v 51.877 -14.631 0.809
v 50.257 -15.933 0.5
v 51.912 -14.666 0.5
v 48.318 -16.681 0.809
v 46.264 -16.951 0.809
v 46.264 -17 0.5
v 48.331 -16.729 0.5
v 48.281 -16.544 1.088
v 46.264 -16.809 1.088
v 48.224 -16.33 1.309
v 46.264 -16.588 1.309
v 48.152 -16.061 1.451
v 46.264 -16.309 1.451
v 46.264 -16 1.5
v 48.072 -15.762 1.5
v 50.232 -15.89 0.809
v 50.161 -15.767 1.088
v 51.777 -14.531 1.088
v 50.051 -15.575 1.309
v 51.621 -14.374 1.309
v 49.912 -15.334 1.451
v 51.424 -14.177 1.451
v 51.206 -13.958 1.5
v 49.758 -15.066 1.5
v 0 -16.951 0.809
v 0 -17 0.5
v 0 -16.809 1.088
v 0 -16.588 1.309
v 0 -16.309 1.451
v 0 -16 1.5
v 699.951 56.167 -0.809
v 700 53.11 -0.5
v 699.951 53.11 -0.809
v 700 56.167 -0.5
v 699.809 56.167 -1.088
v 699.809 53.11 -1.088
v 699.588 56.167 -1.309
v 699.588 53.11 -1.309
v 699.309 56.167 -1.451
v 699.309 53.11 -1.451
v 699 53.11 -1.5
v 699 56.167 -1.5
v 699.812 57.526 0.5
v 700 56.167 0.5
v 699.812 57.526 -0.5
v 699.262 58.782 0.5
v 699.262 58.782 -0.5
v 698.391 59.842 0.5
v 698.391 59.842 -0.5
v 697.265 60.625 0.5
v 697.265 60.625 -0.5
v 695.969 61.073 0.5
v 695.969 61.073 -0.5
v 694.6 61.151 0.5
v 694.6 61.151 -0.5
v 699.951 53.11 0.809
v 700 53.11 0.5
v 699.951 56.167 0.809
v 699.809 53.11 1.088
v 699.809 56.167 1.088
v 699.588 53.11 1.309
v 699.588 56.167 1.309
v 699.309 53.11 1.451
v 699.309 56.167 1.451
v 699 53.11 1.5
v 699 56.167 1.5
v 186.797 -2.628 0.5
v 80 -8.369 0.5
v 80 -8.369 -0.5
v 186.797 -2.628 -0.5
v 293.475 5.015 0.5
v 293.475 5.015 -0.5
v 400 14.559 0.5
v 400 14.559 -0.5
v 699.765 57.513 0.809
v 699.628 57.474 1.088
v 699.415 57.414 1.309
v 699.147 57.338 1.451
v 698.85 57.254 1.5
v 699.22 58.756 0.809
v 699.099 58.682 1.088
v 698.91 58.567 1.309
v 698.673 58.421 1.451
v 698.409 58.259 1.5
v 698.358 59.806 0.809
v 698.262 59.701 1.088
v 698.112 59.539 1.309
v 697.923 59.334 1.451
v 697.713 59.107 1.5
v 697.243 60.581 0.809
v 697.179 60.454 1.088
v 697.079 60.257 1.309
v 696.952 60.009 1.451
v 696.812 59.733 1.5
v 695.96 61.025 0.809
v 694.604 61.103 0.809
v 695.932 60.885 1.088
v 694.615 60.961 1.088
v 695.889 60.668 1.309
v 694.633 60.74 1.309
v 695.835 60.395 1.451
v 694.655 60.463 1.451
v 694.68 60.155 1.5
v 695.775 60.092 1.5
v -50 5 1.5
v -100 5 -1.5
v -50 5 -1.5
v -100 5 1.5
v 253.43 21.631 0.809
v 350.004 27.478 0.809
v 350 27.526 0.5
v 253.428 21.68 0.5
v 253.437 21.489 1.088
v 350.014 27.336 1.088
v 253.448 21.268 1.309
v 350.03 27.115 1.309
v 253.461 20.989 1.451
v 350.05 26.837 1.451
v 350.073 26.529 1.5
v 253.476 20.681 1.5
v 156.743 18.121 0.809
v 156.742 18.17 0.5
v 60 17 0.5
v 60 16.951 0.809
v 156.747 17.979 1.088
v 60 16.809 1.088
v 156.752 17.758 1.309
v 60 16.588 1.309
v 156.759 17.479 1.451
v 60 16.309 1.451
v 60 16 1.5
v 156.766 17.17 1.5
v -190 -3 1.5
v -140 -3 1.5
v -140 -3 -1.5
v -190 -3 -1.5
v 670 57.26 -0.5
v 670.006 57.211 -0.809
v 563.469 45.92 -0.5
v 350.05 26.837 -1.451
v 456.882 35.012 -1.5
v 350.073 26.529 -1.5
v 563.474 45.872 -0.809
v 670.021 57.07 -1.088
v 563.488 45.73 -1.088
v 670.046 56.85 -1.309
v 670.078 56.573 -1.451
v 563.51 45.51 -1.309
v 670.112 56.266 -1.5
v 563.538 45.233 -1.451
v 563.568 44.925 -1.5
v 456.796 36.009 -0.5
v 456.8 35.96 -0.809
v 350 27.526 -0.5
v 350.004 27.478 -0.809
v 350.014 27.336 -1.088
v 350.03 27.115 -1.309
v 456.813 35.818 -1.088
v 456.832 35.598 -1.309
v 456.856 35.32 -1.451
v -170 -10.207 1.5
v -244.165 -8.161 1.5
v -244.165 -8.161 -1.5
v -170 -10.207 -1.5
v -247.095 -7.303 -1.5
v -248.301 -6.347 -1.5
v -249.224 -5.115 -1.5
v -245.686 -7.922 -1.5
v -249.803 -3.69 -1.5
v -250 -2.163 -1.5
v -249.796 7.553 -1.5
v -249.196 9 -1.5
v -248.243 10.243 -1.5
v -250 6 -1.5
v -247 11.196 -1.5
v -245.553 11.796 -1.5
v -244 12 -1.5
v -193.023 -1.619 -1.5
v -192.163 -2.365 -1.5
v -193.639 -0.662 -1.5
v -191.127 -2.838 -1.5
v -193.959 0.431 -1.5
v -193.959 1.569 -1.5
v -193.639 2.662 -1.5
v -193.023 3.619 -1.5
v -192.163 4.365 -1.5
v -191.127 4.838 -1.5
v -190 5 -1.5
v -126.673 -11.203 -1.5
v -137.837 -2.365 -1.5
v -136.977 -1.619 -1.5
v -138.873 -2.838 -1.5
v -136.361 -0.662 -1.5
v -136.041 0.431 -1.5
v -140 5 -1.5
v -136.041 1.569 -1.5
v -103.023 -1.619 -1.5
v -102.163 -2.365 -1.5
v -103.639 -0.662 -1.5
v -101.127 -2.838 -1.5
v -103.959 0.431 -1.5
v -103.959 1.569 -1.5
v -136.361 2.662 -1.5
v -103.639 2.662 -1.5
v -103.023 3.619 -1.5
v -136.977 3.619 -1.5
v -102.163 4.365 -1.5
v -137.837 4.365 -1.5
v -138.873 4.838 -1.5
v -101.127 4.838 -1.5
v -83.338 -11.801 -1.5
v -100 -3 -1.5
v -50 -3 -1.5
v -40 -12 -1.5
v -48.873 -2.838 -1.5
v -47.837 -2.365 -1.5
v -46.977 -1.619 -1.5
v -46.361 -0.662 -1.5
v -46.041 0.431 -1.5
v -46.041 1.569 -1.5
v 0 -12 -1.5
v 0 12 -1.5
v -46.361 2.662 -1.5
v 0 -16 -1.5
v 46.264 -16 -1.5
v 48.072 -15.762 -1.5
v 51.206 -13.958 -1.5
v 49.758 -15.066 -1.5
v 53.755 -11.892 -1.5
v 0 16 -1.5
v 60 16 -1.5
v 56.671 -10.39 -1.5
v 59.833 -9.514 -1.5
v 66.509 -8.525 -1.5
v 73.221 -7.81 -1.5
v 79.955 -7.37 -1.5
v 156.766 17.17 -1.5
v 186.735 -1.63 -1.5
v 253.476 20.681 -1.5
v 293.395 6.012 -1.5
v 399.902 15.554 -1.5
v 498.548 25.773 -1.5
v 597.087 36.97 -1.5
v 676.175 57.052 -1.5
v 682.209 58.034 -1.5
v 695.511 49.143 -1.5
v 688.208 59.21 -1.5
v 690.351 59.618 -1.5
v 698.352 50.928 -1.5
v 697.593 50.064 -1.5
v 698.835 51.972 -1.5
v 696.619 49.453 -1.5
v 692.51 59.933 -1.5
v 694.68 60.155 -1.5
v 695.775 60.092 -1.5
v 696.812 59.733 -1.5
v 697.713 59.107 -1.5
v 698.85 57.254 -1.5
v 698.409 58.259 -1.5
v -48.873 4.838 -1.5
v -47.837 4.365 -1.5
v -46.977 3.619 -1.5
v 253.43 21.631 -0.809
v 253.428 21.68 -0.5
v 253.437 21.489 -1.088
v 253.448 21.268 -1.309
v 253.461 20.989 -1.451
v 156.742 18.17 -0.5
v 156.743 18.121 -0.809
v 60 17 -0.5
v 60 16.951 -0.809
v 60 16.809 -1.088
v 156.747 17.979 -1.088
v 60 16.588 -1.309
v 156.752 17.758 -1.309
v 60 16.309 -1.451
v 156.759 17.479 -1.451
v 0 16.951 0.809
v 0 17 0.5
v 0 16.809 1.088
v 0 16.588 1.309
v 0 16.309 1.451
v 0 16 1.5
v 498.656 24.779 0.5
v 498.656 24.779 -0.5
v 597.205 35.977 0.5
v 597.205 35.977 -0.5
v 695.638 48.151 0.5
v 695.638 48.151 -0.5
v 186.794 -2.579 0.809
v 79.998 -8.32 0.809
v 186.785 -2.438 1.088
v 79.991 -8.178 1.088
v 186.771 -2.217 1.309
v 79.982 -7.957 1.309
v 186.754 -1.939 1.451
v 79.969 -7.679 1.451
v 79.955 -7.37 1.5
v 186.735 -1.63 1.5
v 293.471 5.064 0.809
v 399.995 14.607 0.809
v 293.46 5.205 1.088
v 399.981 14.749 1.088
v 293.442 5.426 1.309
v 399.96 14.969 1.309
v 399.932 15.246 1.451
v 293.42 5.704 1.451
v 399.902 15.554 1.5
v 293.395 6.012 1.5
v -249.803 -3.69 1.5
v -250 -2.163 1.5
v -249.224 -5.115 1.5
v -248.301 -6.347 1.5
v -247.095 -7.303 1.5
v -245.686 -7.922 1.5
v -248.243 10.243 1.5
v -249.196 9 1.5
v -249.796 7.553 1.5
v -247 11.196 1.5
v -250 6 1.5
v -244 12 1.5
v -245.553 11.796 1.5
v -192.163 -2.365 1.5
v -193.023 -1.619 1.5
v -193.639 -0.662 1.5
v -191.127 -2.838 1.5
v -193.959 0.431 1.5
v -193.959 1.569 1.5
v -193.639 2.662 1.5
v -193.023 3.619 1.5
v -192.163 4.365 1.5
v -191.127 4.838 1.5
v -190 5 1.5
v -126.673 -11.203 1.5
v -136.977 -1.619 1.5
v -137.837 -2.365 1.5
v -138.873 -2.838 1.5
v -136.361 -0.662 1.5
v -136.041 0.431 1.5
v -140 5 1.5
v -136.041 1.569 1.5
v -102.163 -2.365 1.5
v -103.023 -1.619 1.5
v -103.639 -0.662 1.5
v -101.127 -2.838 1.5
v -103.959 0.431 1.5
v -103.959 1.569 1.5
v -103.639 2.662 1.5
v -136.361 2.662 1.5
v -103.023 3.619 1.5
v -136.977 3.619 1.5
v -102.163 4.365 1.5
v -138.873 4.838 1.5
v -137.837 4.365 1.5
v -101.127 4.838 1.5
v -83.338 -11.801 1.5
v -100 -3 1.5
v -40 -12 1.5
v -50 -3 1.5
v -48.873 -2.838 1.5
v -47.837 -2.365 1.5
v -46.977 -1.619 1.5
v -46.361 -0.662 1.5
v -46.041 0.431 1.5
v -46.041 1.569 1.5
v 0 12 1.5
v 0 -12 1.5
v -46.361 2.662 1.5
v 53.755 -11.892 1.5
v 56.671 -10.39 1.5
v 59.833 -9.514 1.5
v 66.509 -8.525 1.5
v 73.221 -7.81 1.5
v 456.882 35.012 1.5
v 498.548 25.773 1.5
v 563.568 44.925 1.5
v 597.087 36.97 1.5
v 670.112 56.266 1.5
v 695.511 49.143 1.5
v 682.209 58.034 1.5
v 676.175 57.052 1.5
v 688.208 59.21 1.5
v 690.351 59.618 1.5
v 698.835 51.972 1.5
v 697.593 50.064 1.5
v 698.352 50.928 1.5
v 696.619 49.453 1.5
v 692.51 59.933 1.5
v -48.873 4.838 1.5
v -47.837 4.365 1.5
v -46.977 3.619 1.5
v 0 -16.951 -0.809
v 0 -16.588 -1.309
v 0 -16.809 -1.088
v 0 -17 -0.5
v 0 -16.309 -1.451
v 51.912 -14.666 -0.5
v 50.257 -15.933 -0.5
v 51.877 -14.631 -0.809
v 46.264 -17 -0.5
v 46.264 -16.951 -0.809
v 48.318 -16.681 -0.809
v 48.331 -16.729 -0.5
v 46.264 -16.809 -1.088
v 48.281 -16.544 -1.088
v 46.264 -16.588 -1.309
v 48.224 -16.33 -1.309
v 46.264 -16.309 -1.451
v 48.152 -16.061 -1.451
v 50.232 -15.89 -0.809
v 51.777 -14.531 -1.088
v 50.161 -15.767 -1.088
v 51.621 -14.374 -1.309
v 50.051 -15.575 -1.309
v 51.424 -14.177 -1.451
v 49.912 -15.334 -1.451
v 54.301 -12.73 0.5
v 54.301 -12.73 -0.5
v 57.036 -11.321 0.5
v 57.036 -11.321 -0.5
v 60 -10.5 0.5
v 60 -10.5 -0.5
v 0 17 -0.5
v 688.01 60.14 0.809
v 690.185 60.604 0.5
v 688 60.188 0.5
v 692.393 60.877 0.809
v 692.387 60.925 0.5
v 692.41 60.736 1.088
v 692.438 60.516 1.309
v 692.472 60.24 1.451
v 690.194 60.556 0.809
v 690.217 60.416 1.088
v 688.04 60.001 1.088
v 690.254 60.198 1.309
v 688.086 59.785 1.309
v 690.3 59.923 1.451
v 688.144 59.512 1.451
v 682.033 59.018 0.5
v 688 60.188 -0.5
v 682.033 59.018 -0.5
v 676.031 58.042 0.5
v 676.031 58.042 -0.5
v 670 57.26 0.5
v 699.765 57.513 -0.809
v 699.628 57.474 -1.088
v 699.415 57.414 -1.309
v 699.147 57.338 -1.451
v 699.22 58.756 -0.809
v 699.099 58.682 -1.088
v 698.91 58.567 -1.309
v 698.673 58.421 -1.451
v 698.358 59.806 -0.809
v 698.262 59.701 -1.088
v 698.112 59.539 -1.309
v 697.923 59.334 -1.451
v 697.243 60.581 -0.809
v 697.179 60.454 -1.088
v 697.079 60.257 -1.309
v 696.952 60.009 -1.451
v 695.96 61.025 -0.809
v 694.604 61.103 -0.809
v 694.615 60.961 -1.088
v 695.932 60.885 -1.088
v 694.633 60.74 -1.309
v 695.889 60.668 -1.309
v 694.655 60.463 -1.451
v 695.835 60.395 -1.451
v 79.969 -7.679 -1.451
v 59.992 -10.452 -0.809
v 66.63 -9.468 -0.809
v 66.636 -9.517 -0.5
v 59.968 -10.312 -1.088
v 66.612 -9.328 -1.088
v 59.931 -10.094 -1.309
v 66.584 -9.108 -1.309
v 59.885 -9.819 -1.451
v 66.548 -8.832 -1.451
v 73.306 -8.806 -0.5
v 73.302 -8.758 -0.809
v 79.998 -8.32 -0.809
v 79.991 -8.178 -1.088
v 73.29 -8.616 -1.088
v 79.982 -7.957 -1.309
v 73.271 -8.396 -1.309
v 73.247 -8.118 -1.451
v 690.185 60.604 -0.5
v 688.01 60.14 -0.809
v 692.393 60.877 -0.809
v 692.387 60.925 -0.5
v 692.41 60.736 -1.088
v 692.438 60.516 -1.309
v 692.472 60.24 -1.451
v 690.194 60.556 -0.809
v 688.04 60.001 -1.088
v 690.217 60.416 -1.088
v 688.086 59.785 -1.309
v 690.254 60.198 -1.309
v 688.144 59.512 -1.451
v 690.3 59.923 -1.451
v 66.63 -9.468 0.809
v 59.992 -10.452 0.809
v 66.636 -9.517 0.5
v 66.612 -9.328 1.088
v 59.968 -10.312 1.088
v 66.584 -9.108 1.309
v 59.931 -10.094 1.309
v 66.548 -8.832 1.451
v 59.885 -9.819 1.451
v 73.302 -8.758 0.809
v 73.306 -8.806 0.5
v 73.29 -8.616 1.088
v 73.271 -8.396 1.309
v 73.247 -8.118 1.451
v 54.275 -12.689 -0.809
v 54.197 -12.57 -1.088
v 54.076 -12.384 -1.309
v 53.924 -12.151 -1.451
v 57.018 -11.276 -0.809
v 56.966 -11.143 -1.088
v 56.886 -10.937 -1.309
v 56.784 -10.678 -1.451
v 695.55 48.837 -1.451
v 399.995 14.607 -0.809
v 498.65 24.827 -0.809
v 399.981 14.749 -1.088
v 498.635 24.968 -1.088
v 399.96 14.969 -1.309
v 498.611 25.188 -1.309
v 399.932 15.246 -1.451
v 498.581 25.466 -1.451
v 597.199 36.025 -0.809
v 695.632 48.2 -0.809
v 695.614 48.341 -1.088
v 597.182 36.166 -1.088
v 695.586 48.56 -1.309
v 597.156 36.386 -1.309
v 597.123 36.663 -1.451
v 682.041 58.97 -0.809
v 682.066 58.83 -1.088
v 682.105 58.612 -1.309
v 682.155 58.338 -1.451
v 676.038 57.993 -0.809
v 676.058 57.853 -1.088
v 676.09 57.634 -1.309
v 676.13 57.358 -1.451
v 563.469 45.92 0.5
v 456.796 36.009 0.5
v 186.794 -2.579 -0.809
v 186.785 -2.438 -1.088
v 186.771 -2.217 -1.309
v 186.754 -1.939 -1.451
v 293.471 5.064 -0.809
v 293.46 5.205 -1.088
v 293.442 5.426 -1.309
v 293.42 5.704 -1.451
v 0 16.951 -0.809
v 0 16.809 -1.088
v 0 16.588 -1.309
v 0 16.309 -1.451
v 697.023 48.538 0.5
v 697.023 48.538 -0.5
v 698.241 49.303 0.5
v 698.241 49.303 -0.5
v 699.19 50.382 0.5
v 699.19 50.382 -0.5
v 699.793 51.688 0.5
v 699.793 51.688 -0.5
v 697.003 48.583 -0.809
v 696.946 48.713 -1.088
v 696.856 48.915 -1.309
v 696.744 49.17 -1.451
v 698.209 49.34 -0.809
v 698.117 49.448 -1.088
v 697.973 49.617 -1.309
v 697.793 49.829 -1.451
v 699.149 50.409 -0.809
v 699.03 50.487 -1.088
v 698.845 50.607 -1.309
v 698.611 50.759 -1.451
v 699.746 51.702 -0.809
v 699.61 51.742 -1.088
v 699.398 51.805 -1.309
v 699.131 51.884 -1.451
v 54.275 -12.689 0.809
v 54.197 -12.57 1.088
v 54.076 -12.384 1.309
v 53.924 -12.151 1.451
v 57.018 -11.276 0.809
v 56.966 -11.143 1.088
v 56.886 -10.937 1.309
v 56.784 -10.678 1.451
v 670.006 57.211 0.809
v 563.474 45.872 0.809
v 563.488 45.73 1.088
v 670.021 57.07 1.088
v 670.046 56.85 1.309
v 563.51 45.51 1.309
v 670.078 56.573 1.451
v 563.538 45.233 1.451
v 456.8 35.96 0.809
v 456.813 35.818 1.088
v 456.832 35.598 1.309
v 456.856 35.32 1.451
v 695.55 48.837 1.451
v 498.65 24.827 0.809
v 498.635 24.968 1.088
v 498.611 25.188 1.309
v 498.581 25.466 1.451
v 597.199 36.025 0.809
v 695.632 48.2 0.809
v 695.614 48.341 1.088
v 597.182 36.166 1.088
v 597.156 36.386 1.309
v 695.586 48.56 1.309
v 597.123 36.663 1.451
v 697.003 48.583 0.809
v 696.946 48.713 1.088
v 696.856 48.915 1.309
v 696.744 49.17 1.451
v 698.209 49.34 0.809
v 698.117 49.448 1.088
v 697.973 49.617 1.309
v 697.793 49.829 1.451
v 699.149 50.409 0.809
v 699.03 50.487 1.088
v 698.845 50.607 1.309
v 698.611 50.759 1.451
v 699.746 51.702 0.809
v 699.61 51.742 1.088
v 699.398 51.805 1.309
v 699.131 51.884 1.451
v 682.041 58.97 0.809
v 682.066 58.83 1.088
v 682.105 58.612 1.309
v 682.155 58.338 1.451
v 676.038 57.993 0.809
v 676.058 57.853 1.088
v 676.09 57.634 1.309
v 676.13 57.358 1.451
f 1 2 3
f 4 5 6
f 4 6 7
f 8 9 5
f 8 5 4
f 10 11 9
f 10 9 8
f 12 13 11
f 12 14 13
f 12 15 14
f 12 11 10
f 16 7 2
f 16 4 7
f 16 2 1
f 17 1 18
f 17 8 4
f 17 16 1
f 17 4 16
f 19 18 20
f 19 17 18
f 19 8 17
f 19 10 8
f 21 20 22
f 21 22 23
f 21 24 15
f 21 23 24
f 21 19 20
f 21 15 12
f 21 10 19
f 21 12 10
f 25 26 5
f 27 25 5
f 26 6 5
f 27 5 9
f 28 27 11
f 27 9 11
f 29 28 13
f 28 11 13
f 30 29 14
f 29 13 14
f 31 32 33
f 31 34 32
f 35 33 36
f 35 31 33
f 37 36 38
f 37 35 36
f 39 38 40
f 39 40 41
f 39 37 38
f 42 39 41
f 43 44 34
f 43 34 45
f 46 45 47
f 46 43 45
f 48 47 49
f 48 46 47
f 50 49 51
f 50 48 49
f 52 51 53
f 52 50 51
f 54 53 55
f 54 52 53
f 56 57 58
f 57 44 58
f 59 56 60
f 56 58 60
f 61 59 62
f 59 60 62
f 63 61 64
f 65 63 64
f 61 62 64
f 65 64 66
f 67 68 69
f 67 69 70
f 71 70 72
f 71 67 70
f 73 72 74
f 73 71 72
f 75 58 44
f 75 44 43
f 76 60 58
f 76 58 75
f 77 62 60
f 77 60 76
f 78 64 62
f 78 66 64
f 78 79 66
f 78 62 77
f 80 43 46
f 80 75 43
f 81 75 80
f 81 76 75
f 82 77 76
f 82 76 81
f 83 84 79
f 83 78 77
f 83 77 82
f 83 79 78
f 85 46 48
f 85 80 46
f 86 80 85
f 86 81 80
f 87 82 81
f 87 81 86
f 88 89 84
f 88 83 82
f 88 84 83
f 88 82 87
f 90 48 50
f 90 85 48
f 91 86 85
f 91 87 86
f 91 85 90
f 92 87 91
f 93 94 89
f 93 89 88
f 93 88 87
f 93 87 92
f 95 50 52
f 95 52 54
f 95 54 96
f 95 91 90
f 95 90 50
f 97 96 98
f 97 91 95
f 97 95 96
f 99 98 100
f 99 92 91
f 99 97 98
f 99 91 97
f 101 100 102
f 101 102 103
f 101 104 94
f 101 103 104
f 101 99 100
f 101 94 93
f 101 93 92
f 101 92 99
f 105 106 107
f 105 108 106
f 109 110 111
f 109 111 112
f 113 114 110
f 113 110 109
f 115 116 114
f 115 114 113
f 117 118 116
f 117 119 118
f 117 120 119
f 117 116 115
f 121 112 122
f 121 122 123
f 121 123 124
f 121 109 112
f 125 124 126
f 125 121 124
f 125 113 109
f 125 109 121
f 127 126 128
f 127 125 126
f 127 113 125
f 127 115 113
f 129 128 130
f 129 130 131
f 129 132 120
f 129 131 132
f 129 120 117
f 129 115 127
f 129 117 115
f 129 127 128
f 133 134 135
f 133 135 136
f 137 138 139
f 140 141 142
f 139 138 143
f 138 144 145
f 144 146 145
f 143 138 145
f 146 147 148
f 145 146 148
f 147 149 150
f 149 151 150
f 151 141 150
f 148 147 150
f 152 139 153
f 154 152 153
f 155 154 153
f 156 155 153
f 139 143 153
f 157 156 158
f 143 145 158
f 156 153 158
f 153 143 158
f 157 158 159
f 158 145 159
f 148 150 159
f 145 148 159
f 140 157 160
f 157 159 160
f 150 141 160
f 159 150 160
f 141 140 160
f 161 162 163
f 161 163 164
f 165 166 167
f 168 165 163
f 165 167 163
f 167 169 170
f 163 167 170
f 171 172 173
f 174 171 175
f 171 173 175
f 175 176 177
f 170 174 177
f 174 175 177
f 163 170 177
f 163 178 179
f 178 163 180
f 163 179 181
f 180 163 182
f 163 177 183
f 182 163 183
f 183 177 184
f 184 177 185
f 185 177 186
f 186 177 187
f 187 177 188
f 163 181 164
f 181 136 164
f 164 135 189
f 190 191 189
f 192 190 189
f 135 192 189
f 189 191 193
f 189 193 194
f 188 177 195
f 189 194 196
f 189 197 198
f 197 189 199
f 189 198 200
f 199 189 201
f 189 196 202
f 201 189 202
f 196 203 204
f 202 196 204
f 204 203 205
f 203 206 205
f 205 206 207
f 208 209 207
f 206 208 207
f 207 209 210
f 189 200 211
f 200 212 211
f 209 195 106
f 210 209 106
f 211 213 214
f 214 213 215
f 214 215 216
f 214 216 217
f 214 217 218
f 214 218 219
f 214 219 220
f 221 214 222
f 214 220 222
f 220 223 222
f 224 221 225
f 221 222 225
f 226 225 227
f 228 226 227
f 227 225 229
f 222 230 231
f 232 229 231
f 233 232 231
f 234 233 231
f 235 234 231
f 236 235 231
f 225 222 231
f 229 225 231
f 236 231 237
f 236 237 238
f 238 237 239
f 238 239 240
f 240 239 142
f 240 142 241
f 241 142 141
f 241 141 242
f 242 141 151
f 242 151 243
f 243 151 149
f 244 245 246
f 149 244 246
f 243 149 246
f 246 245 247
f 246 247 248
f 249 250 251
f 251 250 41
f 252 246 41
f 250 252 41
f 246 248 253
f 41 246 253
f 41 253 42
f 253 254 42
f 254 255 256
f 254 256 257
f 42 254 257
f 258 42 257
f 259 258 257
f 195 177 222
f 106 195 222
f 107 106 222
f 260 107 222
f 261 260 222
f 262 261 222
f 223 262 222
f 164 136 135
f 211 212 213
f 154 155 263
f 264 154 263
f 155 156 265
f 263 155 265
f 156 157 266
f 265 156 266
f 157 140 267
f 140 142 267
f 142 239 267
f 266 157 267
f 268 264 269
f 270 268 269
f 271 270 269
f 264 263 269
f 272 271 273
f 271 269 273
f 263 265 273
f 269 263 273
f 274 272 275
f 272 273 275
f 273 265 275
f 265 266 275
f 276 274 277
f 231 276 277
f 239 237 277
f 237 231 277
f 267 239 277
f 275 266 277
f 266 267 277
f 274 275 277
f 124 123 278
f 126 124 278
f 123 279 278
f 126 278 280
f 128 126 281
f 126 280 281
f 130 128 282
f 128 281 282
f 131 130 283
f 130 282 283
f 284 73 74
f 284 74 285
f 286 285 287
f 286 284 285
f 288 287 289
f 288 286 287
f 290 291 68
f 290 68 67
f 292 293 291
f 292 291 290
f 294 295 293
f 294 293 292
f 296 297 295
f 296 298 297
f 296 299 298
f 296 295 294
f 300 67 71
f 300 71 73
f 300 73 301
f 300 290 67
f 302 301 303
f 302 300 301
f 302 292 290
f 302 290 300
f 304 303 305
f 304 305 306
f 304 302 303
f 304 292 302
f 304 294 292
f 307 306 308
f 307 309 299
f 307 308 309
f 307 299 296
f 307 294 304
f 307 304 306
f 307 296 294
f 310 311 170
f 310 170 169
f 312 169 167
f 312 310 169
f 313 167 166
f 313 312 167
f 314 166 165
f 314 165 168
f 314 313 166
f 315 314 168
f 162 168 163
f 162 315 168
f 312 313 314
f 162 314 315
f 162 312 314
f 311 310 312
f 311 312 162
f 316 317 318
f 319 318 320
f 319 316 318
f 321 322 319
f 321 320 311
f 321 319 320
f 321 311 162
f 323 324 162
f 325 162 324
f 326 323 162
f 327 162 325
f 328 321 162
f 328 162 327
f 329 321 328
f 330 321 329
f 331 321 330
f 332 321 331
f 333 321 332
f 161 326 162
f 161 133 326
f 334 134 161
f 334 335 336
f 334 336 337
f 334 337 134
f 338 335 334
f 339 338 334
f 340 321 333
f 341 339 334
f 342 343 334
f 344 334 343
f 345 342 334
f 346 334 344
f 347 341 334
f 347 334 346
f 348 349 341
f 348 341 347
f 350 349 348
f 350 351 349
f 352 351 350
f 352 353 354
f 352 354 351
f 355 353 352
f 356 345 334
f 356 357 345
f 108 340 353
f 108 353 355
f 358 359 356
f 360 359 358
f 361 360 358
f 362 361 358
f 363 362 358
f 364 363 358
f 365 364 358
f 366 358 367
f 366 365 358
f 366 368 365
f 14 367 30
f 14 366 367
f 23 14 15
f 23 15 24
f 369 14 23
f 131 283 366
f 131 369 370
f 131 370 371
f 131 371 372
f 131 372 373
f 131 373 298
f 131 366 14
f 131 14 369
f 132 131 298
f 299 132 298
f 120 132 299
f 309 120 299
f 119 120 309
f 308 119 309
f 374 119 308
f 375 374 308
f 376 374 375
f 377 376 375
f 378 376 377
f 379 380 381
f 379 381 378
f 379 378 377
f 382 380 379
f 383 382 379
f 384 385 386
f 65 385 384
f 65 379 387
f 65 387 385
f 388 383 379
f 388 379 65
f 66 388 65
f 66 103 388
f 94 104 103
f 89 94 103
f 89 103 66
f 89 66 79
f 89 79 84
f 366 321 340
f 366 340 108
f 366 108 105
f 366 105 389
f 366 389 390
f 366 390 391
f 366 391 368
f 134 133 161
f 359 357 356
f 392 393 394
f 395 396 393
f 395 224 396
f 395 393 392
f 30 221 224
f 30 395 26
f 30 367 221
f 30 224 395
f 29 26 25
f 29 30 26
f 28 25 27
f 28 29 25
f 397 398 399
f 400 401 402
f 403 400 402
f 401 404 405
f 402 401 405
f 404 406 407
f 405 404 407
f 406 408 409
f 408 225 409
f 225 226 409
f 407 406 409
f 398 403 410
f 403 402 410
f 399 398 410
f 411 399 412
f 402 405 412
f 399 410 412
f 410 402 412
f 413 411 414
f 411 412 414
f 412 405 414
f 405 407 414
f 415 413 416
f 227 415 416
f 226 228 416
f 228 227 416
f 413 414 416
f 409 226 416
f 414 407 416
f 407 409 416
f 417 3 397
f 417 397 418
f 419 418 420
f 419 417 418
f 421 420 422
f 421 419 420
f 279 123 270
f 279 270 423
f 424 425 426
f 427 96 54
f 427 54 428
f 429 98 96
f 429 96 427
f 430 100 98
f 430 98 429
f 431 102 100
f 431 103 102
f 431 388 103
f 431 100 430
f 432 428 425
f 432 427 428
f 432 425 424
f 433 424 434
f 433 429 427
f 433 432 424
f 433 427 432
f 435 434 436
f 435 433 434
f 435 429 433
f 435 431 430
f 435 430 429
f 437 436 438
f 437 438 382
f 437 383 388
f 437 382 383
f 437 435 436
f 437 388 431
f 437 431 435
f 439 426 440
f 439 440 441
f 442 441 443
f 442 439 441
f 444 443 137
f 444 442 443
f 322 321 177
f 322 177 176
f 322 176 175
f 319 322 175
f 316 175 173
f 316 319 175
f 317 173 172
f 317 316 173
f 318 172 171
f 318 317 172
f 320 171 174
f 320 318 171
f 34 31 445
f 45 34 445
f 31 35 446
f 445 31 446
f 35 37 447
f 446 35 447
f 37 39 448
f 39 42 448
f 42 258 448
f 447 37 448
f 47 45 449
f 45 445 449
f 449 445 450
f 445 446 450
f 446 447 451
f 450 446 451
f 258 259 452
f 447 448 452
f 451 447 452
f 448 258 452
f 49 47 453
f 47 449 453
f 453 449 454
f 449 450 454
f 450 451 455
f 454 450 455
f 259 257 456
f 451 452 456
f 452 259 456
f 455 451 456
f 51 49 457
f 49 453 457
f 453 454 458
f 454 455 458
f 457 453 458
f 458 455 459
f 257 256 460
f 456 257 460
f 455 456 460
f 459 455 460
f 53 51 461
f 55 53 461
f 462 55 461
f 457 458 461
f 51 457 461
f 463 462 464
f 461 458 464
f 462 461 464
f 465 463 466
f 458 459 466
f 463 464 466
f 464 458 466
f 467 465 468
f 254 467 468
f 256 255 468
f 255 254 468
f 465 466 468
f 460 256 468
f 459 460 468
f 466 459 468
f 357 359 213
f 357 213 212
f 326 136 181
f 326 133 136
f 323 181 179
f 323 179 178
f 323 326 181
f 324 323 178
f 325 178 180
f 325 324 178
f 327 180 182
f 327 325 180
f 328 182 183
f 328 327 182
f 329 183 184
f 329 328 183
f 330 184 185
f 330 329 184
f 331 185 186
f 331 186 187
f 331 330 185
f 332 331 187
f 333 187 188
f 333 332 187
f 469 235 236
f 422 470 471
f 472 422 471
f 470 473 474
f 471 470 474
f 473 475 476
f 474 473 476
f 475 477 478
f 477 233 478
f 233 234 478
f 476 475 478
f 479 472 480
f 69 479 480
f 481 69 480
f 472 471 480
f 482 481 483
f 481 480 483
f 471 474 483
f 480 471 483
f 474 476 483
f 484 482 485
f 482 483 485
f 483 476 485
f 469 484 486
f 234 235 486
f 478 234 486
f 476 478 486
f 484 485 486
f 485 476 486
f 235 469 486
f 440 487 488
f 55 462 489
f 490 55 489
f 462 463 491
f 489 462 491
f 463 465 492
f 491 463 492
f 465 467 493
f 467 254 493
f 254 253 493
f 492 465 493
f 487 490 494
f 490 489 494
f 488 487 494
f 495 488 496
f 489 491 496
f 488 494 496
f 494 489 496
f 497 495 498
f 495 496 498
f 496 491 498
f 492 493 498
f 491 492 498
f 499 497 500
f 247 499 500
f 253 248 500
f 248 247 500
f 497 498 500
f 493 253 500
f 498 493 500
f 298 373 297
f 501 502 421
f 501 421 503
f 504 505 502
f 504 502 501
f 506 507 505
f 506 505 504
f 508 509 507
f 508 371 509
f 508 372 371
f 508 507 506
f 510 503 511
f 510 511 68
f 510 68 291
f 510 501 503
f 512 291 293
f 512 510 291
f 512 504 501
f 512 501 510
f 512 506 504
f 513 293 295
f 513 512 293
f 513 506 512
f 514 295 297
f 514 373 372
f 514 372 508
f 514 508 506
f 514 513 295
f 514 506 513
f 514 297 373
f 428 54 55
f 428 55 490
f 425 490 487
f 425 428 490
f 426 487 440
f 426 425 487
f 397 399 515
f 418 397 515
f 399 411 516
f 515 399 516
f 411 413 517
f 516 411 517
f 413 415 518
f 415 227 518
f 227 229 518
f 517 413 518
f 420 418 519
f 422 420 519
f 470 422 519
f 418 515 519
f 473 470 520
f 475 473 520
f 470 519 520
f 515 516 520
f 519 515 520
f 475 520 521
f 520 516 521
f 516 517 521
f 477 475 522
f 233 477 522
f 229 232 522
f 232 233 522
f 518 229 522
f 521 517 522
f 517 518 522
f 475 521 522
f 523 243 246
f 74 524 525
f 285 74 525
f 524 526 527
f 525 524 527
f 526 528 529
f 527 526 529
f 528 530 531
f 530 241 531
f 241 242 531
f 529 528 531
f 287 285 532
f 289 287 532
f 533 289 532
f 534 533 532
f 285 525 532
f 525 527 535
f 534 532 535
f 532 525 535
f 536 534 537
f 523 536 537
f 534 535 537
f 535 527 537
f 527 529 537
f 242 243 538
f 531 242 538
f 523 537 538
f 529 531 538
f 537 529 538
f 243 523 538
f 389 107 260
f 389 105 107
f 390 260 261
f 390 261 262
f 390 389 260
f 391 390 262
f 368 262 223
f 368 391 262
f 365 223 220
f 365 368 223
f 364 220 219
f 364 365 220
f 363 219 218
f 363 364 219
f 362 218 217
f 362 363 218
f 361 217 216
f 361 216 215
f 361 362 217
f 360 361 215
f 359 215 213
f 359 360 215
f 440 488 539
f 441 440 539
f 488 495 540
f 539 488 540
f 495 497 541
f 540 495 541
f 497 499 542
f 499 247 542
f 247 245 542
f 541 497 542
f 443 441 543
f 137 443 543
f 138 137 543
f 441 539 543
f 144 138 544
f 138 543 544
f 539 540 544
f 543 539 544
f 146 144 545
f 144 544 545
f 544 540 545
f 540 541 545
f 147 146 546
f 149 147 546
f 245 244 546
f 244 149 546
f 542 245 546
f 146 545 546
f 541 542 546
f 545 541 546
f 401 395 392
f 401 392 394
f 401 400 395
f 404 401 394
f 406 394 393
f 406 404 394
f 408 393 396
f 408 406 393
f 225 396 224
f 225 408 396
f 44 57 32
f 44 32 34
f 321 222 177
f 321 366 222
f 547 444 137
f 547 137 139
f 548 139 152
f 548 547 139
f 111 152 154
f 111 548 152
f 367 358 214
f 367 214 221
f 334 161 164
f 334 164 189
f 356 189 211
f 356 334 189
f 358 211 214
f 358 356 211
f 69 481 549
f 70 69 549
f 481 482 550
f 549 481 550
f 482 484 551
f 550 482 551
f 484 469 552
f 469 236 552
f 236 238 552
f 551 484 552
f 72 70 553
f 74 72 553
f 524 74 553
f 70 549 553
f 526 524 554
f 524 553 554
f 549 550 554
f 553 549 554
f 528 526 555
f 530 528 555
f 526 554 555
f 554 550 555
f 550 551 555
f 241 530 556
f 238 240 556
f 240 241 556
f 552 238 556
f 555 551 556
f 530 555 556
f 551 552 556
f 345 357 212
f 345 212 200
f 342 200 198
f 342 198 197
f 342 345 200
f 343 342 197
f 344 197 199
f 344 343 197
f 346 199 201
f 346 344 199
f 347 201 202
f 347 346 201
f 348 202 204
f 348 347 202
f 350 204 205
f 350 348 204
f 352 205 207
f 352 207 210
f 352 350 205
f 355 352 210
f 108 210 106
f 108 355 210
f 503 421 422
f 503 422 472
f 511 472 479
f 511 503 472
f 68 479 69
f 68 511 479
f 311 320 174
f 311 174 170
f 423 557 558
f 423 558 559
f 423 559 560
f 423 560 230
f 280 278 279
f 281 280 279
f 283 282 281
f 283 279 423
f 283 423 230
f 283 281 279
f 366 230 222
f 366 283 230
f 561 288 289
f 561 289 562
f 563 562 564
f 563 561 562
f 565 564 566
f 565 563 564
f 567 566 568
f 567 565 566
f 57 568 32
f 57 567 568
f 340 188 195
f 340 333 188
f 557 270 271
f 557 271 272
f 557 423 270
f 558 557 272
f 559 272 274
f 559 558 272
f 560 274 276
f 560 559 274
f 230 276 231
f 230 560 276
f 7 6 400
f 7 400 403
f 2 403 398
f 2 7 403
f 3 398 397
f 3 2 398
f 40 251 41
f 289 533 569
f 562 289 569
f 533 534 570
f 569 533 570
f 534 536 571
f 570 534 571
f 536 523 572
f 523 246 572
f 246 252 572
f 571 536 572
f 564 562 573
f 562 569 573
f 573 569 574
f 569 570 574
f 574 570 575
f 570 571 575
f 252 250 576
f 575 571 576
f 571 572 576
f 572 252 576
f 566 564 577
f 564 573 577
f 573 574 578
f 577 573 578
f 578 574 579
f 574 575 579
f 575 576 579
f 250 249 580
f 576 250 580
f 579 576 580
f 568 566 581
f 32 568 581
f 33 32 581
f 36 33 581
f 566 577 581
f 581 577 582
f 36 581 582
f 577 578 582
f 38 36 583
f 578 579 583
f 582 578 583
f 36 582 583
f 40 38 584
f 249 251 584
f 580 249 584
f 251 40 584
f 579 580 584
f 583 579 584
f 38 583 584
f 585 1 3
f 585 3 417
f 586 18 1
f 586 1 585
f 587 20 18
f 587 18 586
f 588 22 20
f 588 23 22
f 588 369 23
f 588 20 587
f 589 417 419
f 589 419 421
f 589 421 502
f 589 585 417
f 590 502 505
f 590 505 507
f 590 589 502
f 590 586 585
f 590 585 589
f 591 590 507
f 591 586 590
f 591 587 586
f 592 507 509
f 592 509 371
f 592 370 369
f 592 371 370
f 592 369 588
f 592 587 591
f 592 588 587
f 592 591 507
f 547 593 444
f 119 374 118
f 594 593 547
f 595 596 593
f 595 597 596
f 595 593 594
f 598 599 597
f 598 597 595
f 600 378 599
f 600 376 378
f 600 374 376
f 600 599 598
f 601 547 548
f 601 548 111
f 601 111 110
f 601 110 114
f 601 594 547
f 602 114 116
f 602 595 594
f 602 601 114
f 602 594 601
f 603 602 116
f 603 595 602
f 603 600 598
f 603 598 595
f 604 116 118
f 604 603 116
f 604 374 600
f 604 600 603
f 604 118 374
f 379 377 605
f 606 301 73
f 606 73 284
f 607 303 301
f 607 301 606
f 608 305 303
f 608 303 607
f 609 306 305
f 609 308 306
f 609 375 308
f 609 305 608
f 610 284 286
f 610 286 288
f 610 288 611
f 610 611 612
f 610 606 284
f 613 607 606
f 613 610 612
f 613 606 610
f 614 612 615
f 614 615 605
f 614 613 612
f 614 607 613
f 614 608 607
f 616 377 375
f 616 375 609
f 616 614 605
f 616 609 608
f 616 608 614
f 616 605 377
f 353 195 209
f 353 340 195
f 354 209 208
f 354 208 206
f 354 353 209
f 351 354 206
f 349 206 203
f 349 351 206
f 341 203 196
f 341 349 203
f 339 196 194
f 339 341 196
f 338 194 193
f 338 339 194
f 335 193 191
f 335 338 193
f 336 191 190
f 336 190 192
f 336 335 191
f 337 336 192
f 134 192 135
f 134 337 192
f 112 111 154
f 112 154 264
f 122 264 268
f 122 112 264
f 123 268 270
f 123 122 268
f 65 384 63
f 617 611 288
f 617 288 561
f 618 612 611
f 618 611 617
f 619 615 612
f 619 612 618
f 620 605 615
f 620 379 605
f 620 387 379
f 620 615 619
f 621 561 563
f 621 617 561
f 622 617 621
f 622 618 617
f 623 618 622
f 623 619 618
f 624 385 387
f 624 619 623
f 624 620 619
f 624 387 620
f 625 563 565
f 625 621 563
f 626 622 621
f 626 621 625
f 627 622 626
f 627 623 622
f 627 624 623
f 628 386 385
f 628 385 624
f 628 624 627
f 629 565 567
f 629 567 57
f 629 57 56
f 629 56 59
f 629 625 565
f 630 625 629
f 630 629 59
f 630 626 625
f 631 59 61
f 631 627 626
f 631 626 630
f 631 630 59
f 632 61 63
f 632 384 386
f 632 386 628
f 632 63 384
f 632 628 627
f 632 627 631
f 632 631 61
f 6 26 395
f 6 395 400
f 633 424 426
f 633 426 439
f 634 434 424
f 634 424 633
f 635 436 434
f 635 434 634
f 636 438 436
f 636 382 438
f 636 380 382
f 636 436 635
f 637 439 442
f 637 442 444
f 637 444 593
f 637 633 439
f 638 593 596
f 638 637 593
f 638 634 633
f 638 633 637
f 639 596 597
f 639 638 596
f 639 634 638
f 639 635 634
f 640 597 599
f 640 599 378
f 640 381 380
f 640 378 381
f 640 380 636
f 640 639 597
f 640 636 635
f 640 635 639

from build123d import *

# Parameters (mm, degrees)
EXTRUDE_1_DEPTH = 1.5
FILLET_1_R      = 1


with BuildPart() as part:
    # 草图1 → 凸台-拉伸1 (new body, symmetric)
    with BuildSketch(Plane.XY):
        with BuildLine():
            Line((0, 12), (-244, 12))
            ThreePointArc((-244, 12), (-248.242640687, 10.242640687), (-250, 6))
            Line((-250, 6), (-250, -2.163248404))
            ThreePointArc((-250, -2.163248404), (-248.300744725, -6.346978177), (-244.165468396, -8.160966321))
            Line((-244.165468396, -8.160966321), (-170, -10.207084742))
            ThreePointArc((-170, -10.207084742), (-105.006181524, -11.551749873), (-40, -12))
            Line((-40, -12), (0, -12))
            Line((0, -12), (0, -17))
            Line((0, -17), (46.26417673, -17))
            ThreePointArc((46.26417673, -17), (49.319600445, -16.393536767), (51.911773623, -14.666096481))
            ThreePointArc((51.911773623, -14.666096481), (55.632405886, -11.95502943), (60, -10.5))
            ThreePointArc((60, -10.5), (69.967296952, -9.127550858), (80, -8.368937164))
            ThreePointArc((80, -8.368937164), (240.153269938, 0.955681975), (400, 14.558669968))
            ThreePointArc((400, 14.558669968), (547.944123131, 30.255393679), (695.638352641, 48.151350585))
            ThreePointArc((695.638352641, 48.151350585), (698.754448242, 49.808295298), (700, 53.110433757))
            Line((700, 53.110433757), (700, 56.167376267))
            ThreePointArc((700, 56.167376267), (698.391164992, 59.841610881), (694.6, 61.151350585))
            ThreePointArc((694.6, 61.151350585), (691.284376207, 60.77672414), (688, 60.188014503))
            ThreePointArc((688, 60.188014503), (679.035528815, 58.505530478), (670, 57.25985189))
            ThreePointArc((670, 57.25985189), (510.149322959, 40.78604705), (350, 27.526350507))
            ThreePointArc((350, 27.526350507), (205.095489295, 19.632453853), (60, 17))
            Line((60, 17), (0, 17))
            Line((0, 17), (0, 12))
        make_face()
        with BuildLine():
            Line((-50, -3), (-100, -3))
            ThreePointArc((-100, -3), (-104, 1), (-100, 5))
            Line((-100, 5), (-50, 5))
            ThreePointArc((-50, 5), (-46, 1), (-50, -3))
        make_face(mode=Mode.SUBTRACT)
        with BuildLine():
            Line((-140, -3), (-190, -3))
            ThreePointArc((-190, -3), (-194, 1), (-190, 5))
            Line((-190, 5), (-140, 5))
            ThreePointArc((-140, 5), (-136, 1), (-140, -3))
        make_face(mode=Mode.SUBTRACT)
    extrude(amount=EXTRUDE_1_DEPTH, both=True)

    # 圆角1
    fillet_1_edges = [part.edges().sort_by_distance(p)[0] for p in [
        (30, 17, -1.5),
        (205.095489295, 19.632453853, -1.5),
        (510.149322959, 40.78604705, -1.5),
        (679.035528815, 58.505530478, -1.5),
        (691.284376207, 60.77672414, -1.5),
        (698.391164992, 59.841610881, -1.5),
        (700, 54.638905012, -1.5),
        (698.754448242, 49.808295298, -1.5),
        (547.944123131, 30.255393679, -1.5),
        (240.153269938, 0.955681975, -1.5),
        (69.967296952, -9.127550858, -1.5),
        (55.632405886, -11.95502943, -1.5),
        (49.319600445, -16.393536767, -1.5),
        (23.132088365, -17, -1.5),
        (23.132088365, -17, 1.5),
        (49.319600445, -16.393536767, 1.5),
        (55.632405886, -11.95502943, 1.5),
        (69.967296952, -9.127550858, 1.5),
        (240.153269938, 0.955681975, 1.5),
        (547.944123131, 30.255393679, 1.5),
        (698.754448242, 49.808295298, 1.5),
        (700, 54.638905012, 1.5),
        (698.391164992, 59.841610881, 1.5),
        (691.284376207, 60.77672414, 1.5),
        (679.035528815, 58.505530478, 1.5),
        (510.149322959, 40.78604705, 1.5),
        (205.095489295, 19.632453853, 1.5),
        (30, 17, 1.5),
    ]]
    fillet(fillet_1_edges, radius=FILLET_1_R)


solid = part.part
